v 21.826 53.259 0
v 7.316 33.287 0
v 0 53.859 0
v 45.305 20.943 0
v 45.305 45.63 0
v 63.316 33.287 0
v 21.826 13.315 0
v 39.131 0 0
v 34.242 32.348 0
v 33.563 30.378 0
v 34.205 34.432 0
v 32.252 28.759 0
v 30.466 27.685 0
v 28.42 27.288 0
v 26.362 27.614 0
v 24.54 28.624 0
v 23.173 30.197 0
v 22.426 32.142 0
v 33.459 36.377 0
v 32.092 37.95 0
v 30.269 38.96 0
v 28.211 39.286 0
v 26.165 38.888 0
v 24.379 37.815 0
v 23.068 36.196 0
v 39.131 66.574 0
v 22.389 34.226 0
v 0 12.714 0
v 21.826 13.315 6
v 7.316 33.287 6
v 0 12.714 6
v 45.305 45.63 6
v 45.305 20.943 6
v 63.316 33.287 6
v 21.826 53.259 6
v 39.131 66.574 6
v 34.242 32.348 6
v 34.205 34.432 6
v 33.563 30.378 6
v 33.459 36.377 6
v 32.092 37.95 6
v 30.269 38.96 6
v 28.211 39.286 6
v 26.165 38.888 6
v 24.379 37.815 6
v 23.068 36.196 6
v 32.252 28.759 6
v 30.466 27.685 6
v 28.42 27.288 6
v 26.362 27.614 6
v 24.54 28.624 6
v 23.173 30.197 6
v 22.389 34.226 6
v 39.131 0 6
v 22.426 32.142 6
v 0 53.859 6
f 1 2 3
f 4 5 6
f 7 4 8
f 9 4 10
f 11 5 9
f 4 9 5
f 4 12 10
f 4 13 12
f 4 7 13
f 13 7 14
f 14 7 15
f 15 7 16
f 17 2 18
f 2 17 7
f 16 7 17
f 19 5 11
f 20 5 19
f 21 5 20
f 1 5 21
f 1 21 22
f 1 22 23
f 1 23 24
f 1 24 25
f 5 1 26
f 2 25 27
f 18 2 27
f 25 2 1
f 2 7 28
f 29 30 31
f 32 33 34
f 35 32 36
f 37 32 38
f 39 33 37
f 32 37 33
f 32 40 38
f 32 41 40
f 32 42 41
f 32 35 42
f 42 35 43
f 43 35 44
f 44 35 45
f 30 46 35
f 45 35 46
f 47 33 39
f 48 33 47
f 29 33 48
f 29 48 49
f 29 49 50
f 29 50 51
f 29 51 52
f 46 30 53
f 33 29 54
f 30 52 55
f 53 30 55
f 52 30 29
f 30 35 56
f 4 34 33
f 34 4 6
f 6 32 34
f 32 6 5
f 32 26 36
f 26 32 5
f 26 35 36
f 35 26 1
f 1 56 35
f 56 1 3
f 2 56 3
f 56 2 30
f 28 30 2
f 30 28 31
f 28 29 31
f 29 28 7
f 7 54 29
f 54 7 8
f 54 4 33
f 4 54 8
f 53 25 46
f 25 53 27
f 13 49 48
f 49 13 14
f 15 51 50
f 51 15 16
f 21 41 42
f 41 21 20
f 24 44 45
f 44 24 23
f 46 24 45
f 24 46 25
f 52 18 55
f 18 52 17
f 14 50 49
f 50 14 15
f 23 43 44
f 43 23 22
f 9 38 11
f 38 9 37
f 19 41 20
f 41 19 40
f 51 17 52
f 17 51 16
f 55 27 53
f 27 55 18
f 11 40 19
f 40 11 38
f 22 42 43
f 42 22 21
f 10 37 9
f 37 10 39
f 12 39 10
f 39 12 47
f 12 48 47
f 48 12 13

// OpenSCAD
$fn = 32;

// ----------------------------------------------------------------------
// Star wheel: 5-point blunt, R35
// ----------------------------------------------------------------------

// --- parameters (mm) ---
n_points = 5;             // number of points / teeth
r_out = 35;               // tip radius
r_in = 21;                // root radius
bore_r = 6;               // centre bore radius
plate_t = 6;              // plate thickness, Z (extrusion height)
bore_d = 12;              // centre bore diameter

profile = [[63.316, 33.287], [45.305, 45.63], [39.131, 66.574], [21.826, 53.259], [0, 53.859], [7.316, 33.287], [0, 12.714], [21.826, 13.315], [39.131, 0], [45.305, 20.943]];  // primary outline, 10 points, counter clockwise
void_1 = [[34.205, 34.432], [33.459, 36.377], [32.092, 37.95], [30.269, 38.96], [28.211, 39.286], [26.165, 38.888], [24.379, 37.815], [23.068, 36.196], [22.389, 34.226], [22.426, 32.142], [23.173, 30.197], [24.54, 28.624], [26.362, 27.614], [28.42, 27.288], [30.466, 27.685], [32.252, 28.759], [33.563, 30.378], [34.242, 32.348]];  // centre bore, 18 points

// --- the one profile operation ---
difference() {
  linear_extrude(height = plate_t) polygon(points = profile);
  translate([0, 0, -1])
    linear_extrude(height = plate_t + 2) polygon(points = void_1);
}
